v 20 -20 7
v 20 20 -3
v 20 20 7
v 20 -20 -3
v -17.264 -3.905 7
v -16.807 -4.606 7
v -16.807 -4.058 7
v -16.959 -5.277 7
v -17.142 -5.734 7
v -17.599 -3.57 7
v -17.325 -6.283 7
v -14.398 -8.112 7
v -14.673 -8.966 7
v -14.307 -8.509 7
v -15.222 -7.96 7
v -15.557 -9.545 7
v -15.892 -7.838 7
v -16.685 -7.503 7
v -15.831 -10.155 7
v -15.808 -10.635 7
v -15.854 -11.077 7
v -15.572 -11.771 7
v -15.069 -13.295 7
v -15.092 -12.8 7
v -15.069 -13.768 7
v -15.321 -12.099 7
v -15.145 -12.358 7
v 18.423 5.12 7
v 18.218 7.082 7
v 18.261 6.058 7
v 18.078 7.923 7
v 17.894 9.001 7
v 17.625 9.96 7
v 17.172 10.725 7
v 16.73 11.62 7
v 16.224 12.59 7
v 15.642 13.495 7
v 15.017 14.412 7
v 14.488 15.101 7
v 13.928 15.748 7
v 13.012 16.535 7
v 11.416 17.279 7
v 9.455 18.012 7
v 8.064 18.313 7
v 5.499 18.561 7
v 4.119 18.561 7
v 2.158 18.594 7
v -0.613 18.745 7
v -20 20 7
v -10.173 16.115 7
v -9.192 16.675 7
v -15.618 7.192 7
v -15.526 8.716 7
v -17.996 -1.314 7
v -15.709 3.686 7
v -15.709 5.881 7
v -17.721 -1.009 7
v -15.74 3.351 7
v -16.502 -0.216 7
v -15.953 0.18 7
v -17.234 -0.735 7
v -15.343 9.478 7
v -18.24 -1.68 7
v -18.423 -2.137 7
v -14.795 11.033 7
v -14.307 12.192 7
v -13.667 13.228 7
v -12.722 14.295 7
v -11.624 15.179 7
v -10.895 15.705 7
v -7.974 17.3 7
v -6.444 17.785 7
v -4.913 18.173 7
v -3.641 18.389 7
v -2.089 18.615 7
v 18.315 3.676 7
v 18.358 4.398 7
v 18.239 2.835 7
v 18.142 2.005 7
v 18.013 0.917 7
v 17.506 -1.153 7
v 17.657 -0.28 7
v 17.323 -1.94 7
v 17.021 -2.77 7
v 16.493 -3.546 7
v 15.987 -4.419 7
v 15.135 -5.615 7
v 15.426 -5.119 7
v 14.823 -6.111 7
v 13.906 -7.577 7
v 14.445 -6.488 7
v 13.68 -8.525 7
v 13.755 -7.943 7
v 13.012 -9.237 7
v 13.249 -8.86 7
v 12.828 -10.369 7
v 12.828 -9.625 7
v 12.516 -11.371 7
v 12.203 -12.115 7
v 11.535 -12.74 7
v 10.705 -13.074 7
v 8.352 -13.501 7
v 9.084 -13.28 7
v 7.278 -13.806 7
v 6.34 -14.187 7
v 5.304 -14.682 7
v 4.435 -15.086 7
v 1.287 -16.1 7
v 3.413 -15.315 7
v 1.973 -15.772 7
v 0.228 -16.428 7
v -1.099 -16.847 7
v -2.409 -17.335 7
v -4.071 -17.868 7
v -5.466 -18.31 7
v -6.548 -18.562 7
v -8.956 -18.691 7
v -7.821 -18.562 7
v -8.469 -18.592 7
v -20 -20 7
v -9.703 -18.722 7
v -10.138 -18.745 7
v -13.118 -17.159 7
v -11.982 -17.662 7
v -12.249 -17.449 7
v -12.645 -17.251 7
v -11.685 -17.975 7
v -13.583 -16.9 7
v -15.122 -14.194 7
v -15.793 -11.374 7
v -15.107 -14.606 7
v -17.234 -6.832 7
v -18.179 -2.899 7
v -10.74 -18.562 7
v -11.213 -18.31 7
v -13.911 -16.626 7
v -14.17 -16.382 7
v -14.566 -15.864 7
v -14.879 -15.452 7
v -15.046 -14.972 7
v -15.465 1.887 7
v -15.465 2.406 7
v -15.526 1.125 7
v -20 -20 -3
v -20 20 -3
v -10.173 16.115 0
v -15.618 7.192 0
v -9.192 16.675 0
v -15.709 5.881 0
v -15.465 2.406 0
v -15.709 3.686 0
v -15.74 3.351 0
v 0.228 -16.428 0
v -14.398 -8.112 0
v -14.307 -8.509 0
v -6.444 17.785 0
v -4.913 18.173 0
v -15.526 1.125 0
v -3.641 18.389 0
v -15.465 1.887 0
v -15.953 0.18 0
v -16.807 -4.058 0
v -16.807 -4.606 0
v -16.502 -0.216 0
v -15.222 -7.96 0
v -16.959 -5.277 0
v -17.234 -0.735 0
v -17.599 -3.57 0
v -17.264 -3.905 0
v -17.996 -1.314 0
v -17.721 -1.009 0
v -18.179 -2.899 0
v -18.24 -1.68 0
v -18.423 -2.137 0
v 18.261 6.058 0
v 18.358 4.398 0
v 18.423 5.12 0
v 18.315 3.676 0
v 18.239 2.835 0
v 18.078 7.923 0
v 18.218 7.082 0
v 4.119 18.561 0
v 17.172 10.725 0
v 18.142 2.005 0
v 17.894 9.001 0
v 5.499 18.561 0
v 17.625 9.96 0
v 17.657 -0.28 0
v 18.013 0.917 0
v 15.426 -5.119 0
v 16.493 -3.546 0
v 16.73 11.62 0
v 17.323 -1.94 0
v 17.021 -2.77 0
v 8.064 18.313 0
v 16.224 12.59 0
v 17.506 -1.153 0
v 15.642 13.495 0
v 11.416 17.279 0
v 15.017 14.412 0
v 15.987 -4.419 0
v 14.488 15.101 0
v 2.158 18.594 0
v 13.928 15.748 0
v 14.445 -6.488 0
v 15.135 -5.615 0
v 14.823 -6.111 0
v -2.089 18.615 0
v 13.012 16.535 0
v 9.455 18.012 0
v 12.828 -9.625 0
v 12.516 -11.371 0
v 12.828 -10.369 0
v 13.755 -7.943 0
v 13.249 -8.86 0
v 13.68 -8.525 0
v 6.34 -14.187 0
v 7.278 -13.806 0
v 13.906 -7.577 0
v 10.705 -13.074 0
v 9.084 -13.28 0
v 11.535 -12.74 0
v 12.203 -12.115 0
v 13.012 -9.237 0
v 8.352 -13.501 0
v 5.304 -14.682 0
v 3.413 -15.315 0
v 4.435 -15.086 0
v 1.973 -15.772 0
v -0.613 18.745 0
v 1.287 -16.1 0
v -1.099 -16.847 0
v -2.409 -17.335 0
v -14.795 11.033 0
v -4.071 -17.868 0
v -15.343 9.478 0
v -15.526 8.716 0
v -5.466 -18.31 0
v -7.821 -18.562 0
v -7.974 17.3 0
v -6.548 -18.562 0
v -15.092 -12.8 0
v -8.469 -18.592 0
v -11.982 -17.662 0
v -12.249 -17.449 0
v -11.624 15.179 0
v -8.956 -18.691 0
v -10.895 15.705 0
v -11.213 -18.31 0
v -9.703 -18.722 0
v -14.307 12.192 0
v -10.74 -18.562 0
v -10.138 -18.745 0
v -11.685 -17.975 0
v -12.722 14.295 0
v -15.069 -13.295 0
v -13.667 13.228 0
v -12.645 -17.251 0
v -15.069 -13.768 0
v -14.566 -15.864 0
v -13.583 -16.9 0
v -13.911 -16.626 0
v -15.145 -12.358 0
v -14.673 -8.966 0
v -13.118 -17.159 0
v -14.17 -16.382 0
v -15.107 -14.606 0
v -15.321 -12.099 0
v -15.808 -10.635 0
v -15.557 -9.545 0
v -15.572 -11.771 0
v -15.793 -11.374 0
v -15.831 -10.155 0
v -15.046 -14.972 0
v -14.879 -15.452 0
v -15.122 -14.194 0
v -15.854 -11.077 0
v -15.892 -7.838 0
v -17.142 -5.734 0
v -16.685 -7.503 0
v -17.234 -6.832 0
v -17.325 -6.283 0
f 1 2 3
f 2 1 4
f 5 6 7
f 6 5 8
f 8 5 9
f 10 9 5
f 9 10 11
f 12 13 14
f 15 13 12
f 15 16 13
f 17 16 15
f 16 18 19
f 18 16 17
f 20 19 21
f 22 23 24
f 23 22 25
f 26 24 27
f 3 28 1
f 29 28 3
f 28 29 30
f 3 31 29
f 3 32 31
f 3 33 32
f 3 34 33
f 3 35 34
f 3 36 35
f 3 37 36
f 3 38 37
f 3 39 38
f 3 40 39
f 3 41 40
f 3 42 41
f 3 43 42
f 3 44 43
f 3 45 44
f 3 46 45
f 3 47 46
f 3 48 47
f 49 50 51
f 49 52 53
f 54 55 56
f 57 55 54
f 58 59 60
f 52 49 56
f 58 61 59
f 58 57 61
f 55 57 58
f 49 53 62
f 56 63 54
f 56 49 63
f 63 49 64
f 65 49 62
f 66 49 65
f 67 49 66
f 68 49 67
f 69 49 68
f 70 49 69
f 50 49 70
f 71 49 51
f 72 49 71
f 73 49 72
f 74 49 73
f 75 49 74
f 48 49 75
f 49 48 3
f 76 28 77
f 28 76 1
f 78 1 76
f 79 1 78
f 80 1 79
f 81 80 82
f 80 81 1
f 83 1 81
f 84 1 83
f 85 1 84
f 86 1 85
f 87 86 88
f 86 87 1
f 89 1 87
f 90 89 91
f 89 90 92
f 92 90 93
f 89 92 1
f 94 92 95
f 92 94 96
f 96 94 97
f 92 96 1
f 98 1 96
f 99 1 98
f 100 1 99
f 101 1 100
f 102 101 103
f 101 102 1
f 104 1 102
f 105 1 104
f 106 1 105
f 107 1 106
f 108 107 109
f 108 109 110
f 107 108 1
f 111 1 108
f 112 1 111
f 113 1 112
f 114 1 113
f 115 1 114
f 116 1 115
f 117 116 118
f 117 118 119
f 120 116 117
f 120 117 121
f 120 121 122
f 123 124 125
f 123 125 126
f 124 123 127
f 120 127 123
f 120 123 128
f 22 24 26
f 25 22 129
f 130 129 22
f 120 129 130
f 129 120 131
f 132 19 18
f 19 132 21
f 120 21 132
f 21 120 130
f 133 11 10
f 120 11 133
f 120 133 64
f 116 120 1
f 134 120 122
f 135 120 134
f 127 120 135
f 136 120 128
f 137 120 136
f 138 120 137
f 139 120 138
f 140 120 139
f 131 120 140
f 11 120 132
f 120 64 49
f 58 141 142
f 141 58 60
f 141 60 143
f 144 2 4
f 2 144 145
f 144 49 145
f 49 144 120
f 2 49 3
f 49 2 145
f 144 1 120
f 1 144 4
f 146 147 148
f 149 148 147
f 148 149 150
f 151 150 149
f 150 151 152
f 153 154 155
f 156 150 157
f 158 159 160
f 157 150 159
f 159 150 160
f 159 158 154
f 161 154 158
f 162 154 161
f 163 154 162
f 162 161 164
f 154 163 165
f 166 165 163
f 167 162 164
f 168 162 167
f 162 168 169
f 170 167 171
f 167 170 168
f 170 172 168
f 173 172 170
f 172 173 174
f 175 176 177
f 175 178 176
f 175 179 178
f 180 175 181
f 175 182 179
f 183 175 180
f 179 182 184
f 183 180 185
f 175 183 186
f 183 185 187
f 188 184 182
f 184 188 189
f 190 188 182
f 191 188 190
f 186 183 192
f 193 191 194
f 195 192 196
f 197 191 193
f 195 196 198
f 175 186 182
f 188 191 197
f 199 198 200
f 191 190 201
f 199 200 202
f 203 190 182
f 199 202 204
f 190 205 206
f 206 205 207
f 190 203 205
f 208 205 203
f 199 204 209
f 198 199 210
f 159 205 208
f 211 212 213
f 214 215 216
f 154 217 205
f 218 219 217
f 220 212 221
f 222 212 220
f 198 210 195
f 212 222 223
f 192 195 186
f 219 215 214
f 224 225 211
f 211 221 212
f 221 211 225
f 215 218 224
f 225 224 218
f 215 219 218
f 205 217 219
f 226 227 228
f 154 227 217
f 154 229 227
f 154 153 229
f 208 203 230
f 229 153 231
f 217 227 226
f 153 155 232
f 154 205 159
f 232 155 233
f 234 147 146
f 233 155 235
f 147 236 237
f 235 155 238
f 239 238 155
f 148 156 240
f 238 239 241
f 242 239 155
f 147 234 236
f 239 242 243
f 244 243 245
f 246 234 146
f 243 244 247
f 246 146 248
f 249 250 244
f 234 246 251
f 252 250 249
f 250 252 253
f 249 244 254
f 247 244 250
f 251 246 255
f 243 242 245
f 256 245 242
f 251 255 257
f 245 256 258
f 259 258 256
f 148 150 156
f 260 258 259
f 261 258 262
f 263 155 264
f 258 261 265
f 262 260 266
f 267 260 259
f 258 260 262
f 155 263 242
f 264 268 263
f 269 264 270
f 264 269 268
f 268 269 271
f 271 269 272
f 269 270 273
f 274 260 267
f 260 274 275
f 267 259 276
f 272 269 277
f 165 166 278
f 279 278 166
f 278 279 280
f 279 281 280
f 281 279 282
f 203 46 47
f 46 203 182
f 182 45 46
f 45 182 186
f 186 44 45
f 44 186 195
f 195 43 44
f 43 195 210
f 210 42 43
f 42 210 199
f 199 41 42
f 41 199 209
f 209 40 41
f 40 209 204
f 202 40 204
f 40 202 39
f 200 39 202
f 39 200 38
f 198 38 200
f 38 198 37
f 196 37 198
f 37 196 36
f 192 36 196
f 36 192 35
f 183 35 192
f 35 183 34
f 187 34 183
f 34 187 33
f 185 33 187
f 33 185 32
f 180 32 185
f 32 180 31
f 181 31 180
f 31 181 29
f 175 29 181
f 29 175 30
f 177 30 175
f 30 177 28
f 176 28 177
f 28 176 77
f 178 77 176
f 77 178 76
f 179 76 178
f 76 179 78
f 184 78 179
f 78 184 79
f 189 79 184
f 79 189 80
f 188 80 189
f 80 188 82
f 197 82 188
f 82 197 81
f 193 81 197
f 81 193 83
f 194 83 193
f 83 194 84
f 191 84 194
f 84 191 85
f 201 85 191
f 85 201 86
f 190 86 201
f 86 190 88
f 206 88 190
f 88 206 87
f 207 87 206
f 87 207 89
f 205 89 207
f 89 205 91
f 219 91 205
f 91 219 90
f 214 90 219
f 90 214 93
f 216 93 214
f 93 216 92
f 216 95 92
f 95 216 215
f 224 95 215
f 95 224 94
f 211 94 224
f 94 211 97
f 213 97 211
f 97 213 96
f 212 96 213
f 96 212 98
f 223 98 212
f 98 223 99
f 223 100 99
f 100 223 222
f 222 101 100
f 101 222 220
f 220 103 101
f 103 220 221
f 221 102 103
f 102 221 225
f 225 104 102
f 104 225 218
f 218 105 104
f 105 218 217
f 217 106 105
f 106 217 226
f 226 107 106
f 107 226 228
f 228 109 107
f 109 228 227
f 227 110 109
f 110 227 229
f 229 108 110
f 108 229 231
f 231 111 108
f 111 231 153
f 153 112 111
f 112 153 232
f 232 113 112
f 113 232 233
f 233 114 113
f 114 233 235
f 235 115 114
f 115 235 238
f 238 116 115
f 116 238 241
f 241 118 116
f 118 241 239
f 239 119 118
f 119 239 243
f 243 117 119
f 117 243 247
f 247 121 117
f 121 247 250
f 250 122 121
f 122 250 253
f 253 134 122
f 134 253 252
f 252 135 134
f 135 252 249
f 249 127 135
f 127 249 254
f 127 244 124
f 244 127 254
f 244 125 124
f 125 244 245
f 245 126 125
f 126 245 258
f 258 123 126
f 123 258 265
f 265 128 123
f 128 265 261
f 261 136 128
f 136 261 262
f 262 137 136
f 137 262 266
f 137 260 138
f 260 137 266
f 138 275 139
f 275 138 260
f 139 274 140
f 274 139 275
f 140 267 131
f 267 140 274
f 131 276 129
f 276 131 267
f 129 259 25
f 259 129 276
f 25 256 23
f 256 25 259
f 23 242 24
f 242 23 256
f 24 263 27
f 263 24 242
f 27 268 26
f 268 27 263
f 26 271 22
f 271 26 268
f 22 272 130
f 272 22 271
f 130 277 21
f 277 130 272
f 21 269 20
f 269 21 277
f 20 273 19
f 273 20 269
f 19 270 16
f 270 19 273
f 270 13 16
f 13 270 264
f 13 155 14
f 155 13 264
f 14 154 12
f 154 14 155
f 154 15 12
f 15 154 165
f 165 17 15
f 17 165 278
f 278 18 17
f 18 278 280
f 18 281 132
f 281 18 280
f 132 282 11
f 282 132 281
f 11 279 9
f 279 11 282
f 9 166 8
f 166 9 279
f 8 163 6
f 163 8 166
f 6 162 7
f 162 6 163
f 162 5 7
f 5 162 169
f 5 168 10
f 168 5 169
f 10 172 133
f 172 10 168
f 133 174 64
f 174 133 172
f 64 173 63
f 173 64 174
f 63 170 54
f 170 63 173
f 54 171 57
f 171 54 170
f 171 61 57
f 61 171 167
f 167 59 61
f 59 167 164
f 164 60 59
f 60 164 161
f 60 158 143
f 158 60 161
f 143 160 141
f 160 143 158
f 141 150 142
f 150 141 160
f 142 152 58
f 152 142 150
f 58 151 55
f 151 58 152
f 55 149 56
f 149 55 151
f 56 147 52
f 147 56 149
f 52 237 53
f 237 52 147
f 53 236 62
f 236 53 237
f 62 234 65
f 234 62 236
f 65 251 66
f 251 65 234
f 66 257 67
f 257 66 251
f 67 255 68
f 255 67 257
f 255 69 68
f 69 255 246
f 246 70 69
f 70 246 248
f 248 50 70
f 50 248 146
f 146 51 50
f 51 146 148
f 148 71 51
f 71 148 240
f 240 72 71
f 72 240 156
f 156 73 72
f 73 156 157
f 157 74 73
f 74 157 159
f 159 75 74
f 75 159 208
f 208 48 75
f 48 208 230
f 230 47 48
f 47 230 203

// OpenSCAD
// exported from inkscape

module path_path3778(h)
{
  scale([25.4/90, -25.4/90, 1])
    linear_extrude(height=h)
      polygon(points=[[-41.187673,-53.785561],[-45.076529,-50.652874],[-48.425264,-46.872035],[-50.693765,-43.199227],[-52.422144,-39.094322],[-54.366572,-33.585110],[-55.014718,-30.884513],[-55.338791,-25.483325],[-55.662863,-20.838299],[-55.662863,-16.517346],[-55.662863,-13.060584],[-55.770887,-11.872317],[-54.798669,-8.523582],[-54.798669,-6.687178],[-55.014718,-3.986580],[-56.527057,-0.637850],[-58.471485,0.766470],[-61.064051,2.602870],[-62.792438,3.575080],[-63.764648,4.655330],[-64.628842,5.951610],[-65.276980,7.571960],[-64.412794,10.272560],[-62.360341,12.649090],[-61.172075,13.837350],[-59.551719,14.377470],[-59.551719,16.321890],[-60.091841,18.698420],[-60.739986,20.318780],[-61.388123,22.263200],[-61.064051,24.207630],[-59.119623,26.584160],[-56.311001,27.772420],[-53.934484,28.204510],[-51.017837,28.744630],[-50.693765,30.148940],[-51.990055,31.769300],[-55.122742,33.821750],[-56.094960,35.982220],[-56.013940,37.683600],[-56.175972,39.249950],[-55.959924,40.303190],[-55.176746,41.707490],[-54.285552,42.868740],[-53.664415,43.786950],[-53.475375,45.353300],[-53.394355,47.108680],[-53.394355,48.783050],[-53.583396,50.295380],[-53.529396,51.753709],[-53.313347,53.049989],[-52.719218,54.751369],[-51.611968,56.209680],[-50.207661,58.046090],[-49.289459,58.910280],[-48.128200,59.882490],[-46.480837,60.800699],[-44.806473,61.124769],[-43.402158,61.826929],[-42.456948,62.583089],[-41.403722,63.690339],[-39.729350,64.878599],[-38.054979,65.769789],[-35.921510,66.417939],[-34.382171,66.336939],[-31.735589,66.228919],[-30.007210,65.877839],[-27.711701,65.769809],[-23.201707,65.769809],[-19.366859,64.878619],[-14.424773,63.312279],[-8.537476,61.421859],[-3.892450,59.693469],[0.806586,58.208149],[4.560410,57.046889],[6.990951,55.885639],[12.095074,54.265279],[15.713873,53.455099],[18.792550,52.023789],[22.465360,50.268399],[25.787100,48.918099],[29.594940,47.837859],[32.187500,47.054689],[37.931370,46.325389],[40.872170,45.141439],[43.240090,42.926289],[44.347670,40.291029],[45.455240,36.739159],[45.455240,34.103889],[46.104510,32.728969],[46.944730,31.392249],[48.472420,30.208289],[48.739760,28.145909],[49.274460,26.847379],[51.184070,22.989969],[52.520790,21.653239],[53.628360,19.896409],[54.659560,18.139559],[56.645550,15.657069],[58.440580,12.563499],[60.311990,9.813669],[61.381380,6.872859],[62.030650,4.084829],[62.565340,0.991269],[63.825680,-3.248068],[64.283990,-7.105473],[64.627710,-10.046272],[64.895060,-13.025261],[65.047830,-15.584138],[65.276980,-18.143019],[64.704100,-21.465743],[64.551330,-25.093995],[64.054830,-28.072984],[63.405560,-31.892207],[62.450760,-35.291313],[60.846690,-38.002958],[59.280810,-41.172910],[57.485780,-44.610199],[55.423400,-47.818342],[53.208250,-51.064684],[51.336830,-53.508985],[49.350840,-55.800513],[46.104510,-58.588540],[40.452060,-61.223803],[33.501090,-63.820876],[28.574290,-64.890254],[19.484550,-65.768669],[14.595951,-65.768669],[7.644975,-65.883250],[-2.170420,-66.417939],[-7.402748,-65.959632],[-12.902424,-65.157598],[-17.409102,-64.393755],[-22.832393,-63.018833],[-28.255683,-61.300184],[-32.571403,-59.085038],[-36.046891,-57.099045],[-38.605764,-55.647741],[-41.187673,-53.785561]]);
}

difference() { 
translate([0,0,2]) cube([40,40,10], true);
path_path3778(8);
}
